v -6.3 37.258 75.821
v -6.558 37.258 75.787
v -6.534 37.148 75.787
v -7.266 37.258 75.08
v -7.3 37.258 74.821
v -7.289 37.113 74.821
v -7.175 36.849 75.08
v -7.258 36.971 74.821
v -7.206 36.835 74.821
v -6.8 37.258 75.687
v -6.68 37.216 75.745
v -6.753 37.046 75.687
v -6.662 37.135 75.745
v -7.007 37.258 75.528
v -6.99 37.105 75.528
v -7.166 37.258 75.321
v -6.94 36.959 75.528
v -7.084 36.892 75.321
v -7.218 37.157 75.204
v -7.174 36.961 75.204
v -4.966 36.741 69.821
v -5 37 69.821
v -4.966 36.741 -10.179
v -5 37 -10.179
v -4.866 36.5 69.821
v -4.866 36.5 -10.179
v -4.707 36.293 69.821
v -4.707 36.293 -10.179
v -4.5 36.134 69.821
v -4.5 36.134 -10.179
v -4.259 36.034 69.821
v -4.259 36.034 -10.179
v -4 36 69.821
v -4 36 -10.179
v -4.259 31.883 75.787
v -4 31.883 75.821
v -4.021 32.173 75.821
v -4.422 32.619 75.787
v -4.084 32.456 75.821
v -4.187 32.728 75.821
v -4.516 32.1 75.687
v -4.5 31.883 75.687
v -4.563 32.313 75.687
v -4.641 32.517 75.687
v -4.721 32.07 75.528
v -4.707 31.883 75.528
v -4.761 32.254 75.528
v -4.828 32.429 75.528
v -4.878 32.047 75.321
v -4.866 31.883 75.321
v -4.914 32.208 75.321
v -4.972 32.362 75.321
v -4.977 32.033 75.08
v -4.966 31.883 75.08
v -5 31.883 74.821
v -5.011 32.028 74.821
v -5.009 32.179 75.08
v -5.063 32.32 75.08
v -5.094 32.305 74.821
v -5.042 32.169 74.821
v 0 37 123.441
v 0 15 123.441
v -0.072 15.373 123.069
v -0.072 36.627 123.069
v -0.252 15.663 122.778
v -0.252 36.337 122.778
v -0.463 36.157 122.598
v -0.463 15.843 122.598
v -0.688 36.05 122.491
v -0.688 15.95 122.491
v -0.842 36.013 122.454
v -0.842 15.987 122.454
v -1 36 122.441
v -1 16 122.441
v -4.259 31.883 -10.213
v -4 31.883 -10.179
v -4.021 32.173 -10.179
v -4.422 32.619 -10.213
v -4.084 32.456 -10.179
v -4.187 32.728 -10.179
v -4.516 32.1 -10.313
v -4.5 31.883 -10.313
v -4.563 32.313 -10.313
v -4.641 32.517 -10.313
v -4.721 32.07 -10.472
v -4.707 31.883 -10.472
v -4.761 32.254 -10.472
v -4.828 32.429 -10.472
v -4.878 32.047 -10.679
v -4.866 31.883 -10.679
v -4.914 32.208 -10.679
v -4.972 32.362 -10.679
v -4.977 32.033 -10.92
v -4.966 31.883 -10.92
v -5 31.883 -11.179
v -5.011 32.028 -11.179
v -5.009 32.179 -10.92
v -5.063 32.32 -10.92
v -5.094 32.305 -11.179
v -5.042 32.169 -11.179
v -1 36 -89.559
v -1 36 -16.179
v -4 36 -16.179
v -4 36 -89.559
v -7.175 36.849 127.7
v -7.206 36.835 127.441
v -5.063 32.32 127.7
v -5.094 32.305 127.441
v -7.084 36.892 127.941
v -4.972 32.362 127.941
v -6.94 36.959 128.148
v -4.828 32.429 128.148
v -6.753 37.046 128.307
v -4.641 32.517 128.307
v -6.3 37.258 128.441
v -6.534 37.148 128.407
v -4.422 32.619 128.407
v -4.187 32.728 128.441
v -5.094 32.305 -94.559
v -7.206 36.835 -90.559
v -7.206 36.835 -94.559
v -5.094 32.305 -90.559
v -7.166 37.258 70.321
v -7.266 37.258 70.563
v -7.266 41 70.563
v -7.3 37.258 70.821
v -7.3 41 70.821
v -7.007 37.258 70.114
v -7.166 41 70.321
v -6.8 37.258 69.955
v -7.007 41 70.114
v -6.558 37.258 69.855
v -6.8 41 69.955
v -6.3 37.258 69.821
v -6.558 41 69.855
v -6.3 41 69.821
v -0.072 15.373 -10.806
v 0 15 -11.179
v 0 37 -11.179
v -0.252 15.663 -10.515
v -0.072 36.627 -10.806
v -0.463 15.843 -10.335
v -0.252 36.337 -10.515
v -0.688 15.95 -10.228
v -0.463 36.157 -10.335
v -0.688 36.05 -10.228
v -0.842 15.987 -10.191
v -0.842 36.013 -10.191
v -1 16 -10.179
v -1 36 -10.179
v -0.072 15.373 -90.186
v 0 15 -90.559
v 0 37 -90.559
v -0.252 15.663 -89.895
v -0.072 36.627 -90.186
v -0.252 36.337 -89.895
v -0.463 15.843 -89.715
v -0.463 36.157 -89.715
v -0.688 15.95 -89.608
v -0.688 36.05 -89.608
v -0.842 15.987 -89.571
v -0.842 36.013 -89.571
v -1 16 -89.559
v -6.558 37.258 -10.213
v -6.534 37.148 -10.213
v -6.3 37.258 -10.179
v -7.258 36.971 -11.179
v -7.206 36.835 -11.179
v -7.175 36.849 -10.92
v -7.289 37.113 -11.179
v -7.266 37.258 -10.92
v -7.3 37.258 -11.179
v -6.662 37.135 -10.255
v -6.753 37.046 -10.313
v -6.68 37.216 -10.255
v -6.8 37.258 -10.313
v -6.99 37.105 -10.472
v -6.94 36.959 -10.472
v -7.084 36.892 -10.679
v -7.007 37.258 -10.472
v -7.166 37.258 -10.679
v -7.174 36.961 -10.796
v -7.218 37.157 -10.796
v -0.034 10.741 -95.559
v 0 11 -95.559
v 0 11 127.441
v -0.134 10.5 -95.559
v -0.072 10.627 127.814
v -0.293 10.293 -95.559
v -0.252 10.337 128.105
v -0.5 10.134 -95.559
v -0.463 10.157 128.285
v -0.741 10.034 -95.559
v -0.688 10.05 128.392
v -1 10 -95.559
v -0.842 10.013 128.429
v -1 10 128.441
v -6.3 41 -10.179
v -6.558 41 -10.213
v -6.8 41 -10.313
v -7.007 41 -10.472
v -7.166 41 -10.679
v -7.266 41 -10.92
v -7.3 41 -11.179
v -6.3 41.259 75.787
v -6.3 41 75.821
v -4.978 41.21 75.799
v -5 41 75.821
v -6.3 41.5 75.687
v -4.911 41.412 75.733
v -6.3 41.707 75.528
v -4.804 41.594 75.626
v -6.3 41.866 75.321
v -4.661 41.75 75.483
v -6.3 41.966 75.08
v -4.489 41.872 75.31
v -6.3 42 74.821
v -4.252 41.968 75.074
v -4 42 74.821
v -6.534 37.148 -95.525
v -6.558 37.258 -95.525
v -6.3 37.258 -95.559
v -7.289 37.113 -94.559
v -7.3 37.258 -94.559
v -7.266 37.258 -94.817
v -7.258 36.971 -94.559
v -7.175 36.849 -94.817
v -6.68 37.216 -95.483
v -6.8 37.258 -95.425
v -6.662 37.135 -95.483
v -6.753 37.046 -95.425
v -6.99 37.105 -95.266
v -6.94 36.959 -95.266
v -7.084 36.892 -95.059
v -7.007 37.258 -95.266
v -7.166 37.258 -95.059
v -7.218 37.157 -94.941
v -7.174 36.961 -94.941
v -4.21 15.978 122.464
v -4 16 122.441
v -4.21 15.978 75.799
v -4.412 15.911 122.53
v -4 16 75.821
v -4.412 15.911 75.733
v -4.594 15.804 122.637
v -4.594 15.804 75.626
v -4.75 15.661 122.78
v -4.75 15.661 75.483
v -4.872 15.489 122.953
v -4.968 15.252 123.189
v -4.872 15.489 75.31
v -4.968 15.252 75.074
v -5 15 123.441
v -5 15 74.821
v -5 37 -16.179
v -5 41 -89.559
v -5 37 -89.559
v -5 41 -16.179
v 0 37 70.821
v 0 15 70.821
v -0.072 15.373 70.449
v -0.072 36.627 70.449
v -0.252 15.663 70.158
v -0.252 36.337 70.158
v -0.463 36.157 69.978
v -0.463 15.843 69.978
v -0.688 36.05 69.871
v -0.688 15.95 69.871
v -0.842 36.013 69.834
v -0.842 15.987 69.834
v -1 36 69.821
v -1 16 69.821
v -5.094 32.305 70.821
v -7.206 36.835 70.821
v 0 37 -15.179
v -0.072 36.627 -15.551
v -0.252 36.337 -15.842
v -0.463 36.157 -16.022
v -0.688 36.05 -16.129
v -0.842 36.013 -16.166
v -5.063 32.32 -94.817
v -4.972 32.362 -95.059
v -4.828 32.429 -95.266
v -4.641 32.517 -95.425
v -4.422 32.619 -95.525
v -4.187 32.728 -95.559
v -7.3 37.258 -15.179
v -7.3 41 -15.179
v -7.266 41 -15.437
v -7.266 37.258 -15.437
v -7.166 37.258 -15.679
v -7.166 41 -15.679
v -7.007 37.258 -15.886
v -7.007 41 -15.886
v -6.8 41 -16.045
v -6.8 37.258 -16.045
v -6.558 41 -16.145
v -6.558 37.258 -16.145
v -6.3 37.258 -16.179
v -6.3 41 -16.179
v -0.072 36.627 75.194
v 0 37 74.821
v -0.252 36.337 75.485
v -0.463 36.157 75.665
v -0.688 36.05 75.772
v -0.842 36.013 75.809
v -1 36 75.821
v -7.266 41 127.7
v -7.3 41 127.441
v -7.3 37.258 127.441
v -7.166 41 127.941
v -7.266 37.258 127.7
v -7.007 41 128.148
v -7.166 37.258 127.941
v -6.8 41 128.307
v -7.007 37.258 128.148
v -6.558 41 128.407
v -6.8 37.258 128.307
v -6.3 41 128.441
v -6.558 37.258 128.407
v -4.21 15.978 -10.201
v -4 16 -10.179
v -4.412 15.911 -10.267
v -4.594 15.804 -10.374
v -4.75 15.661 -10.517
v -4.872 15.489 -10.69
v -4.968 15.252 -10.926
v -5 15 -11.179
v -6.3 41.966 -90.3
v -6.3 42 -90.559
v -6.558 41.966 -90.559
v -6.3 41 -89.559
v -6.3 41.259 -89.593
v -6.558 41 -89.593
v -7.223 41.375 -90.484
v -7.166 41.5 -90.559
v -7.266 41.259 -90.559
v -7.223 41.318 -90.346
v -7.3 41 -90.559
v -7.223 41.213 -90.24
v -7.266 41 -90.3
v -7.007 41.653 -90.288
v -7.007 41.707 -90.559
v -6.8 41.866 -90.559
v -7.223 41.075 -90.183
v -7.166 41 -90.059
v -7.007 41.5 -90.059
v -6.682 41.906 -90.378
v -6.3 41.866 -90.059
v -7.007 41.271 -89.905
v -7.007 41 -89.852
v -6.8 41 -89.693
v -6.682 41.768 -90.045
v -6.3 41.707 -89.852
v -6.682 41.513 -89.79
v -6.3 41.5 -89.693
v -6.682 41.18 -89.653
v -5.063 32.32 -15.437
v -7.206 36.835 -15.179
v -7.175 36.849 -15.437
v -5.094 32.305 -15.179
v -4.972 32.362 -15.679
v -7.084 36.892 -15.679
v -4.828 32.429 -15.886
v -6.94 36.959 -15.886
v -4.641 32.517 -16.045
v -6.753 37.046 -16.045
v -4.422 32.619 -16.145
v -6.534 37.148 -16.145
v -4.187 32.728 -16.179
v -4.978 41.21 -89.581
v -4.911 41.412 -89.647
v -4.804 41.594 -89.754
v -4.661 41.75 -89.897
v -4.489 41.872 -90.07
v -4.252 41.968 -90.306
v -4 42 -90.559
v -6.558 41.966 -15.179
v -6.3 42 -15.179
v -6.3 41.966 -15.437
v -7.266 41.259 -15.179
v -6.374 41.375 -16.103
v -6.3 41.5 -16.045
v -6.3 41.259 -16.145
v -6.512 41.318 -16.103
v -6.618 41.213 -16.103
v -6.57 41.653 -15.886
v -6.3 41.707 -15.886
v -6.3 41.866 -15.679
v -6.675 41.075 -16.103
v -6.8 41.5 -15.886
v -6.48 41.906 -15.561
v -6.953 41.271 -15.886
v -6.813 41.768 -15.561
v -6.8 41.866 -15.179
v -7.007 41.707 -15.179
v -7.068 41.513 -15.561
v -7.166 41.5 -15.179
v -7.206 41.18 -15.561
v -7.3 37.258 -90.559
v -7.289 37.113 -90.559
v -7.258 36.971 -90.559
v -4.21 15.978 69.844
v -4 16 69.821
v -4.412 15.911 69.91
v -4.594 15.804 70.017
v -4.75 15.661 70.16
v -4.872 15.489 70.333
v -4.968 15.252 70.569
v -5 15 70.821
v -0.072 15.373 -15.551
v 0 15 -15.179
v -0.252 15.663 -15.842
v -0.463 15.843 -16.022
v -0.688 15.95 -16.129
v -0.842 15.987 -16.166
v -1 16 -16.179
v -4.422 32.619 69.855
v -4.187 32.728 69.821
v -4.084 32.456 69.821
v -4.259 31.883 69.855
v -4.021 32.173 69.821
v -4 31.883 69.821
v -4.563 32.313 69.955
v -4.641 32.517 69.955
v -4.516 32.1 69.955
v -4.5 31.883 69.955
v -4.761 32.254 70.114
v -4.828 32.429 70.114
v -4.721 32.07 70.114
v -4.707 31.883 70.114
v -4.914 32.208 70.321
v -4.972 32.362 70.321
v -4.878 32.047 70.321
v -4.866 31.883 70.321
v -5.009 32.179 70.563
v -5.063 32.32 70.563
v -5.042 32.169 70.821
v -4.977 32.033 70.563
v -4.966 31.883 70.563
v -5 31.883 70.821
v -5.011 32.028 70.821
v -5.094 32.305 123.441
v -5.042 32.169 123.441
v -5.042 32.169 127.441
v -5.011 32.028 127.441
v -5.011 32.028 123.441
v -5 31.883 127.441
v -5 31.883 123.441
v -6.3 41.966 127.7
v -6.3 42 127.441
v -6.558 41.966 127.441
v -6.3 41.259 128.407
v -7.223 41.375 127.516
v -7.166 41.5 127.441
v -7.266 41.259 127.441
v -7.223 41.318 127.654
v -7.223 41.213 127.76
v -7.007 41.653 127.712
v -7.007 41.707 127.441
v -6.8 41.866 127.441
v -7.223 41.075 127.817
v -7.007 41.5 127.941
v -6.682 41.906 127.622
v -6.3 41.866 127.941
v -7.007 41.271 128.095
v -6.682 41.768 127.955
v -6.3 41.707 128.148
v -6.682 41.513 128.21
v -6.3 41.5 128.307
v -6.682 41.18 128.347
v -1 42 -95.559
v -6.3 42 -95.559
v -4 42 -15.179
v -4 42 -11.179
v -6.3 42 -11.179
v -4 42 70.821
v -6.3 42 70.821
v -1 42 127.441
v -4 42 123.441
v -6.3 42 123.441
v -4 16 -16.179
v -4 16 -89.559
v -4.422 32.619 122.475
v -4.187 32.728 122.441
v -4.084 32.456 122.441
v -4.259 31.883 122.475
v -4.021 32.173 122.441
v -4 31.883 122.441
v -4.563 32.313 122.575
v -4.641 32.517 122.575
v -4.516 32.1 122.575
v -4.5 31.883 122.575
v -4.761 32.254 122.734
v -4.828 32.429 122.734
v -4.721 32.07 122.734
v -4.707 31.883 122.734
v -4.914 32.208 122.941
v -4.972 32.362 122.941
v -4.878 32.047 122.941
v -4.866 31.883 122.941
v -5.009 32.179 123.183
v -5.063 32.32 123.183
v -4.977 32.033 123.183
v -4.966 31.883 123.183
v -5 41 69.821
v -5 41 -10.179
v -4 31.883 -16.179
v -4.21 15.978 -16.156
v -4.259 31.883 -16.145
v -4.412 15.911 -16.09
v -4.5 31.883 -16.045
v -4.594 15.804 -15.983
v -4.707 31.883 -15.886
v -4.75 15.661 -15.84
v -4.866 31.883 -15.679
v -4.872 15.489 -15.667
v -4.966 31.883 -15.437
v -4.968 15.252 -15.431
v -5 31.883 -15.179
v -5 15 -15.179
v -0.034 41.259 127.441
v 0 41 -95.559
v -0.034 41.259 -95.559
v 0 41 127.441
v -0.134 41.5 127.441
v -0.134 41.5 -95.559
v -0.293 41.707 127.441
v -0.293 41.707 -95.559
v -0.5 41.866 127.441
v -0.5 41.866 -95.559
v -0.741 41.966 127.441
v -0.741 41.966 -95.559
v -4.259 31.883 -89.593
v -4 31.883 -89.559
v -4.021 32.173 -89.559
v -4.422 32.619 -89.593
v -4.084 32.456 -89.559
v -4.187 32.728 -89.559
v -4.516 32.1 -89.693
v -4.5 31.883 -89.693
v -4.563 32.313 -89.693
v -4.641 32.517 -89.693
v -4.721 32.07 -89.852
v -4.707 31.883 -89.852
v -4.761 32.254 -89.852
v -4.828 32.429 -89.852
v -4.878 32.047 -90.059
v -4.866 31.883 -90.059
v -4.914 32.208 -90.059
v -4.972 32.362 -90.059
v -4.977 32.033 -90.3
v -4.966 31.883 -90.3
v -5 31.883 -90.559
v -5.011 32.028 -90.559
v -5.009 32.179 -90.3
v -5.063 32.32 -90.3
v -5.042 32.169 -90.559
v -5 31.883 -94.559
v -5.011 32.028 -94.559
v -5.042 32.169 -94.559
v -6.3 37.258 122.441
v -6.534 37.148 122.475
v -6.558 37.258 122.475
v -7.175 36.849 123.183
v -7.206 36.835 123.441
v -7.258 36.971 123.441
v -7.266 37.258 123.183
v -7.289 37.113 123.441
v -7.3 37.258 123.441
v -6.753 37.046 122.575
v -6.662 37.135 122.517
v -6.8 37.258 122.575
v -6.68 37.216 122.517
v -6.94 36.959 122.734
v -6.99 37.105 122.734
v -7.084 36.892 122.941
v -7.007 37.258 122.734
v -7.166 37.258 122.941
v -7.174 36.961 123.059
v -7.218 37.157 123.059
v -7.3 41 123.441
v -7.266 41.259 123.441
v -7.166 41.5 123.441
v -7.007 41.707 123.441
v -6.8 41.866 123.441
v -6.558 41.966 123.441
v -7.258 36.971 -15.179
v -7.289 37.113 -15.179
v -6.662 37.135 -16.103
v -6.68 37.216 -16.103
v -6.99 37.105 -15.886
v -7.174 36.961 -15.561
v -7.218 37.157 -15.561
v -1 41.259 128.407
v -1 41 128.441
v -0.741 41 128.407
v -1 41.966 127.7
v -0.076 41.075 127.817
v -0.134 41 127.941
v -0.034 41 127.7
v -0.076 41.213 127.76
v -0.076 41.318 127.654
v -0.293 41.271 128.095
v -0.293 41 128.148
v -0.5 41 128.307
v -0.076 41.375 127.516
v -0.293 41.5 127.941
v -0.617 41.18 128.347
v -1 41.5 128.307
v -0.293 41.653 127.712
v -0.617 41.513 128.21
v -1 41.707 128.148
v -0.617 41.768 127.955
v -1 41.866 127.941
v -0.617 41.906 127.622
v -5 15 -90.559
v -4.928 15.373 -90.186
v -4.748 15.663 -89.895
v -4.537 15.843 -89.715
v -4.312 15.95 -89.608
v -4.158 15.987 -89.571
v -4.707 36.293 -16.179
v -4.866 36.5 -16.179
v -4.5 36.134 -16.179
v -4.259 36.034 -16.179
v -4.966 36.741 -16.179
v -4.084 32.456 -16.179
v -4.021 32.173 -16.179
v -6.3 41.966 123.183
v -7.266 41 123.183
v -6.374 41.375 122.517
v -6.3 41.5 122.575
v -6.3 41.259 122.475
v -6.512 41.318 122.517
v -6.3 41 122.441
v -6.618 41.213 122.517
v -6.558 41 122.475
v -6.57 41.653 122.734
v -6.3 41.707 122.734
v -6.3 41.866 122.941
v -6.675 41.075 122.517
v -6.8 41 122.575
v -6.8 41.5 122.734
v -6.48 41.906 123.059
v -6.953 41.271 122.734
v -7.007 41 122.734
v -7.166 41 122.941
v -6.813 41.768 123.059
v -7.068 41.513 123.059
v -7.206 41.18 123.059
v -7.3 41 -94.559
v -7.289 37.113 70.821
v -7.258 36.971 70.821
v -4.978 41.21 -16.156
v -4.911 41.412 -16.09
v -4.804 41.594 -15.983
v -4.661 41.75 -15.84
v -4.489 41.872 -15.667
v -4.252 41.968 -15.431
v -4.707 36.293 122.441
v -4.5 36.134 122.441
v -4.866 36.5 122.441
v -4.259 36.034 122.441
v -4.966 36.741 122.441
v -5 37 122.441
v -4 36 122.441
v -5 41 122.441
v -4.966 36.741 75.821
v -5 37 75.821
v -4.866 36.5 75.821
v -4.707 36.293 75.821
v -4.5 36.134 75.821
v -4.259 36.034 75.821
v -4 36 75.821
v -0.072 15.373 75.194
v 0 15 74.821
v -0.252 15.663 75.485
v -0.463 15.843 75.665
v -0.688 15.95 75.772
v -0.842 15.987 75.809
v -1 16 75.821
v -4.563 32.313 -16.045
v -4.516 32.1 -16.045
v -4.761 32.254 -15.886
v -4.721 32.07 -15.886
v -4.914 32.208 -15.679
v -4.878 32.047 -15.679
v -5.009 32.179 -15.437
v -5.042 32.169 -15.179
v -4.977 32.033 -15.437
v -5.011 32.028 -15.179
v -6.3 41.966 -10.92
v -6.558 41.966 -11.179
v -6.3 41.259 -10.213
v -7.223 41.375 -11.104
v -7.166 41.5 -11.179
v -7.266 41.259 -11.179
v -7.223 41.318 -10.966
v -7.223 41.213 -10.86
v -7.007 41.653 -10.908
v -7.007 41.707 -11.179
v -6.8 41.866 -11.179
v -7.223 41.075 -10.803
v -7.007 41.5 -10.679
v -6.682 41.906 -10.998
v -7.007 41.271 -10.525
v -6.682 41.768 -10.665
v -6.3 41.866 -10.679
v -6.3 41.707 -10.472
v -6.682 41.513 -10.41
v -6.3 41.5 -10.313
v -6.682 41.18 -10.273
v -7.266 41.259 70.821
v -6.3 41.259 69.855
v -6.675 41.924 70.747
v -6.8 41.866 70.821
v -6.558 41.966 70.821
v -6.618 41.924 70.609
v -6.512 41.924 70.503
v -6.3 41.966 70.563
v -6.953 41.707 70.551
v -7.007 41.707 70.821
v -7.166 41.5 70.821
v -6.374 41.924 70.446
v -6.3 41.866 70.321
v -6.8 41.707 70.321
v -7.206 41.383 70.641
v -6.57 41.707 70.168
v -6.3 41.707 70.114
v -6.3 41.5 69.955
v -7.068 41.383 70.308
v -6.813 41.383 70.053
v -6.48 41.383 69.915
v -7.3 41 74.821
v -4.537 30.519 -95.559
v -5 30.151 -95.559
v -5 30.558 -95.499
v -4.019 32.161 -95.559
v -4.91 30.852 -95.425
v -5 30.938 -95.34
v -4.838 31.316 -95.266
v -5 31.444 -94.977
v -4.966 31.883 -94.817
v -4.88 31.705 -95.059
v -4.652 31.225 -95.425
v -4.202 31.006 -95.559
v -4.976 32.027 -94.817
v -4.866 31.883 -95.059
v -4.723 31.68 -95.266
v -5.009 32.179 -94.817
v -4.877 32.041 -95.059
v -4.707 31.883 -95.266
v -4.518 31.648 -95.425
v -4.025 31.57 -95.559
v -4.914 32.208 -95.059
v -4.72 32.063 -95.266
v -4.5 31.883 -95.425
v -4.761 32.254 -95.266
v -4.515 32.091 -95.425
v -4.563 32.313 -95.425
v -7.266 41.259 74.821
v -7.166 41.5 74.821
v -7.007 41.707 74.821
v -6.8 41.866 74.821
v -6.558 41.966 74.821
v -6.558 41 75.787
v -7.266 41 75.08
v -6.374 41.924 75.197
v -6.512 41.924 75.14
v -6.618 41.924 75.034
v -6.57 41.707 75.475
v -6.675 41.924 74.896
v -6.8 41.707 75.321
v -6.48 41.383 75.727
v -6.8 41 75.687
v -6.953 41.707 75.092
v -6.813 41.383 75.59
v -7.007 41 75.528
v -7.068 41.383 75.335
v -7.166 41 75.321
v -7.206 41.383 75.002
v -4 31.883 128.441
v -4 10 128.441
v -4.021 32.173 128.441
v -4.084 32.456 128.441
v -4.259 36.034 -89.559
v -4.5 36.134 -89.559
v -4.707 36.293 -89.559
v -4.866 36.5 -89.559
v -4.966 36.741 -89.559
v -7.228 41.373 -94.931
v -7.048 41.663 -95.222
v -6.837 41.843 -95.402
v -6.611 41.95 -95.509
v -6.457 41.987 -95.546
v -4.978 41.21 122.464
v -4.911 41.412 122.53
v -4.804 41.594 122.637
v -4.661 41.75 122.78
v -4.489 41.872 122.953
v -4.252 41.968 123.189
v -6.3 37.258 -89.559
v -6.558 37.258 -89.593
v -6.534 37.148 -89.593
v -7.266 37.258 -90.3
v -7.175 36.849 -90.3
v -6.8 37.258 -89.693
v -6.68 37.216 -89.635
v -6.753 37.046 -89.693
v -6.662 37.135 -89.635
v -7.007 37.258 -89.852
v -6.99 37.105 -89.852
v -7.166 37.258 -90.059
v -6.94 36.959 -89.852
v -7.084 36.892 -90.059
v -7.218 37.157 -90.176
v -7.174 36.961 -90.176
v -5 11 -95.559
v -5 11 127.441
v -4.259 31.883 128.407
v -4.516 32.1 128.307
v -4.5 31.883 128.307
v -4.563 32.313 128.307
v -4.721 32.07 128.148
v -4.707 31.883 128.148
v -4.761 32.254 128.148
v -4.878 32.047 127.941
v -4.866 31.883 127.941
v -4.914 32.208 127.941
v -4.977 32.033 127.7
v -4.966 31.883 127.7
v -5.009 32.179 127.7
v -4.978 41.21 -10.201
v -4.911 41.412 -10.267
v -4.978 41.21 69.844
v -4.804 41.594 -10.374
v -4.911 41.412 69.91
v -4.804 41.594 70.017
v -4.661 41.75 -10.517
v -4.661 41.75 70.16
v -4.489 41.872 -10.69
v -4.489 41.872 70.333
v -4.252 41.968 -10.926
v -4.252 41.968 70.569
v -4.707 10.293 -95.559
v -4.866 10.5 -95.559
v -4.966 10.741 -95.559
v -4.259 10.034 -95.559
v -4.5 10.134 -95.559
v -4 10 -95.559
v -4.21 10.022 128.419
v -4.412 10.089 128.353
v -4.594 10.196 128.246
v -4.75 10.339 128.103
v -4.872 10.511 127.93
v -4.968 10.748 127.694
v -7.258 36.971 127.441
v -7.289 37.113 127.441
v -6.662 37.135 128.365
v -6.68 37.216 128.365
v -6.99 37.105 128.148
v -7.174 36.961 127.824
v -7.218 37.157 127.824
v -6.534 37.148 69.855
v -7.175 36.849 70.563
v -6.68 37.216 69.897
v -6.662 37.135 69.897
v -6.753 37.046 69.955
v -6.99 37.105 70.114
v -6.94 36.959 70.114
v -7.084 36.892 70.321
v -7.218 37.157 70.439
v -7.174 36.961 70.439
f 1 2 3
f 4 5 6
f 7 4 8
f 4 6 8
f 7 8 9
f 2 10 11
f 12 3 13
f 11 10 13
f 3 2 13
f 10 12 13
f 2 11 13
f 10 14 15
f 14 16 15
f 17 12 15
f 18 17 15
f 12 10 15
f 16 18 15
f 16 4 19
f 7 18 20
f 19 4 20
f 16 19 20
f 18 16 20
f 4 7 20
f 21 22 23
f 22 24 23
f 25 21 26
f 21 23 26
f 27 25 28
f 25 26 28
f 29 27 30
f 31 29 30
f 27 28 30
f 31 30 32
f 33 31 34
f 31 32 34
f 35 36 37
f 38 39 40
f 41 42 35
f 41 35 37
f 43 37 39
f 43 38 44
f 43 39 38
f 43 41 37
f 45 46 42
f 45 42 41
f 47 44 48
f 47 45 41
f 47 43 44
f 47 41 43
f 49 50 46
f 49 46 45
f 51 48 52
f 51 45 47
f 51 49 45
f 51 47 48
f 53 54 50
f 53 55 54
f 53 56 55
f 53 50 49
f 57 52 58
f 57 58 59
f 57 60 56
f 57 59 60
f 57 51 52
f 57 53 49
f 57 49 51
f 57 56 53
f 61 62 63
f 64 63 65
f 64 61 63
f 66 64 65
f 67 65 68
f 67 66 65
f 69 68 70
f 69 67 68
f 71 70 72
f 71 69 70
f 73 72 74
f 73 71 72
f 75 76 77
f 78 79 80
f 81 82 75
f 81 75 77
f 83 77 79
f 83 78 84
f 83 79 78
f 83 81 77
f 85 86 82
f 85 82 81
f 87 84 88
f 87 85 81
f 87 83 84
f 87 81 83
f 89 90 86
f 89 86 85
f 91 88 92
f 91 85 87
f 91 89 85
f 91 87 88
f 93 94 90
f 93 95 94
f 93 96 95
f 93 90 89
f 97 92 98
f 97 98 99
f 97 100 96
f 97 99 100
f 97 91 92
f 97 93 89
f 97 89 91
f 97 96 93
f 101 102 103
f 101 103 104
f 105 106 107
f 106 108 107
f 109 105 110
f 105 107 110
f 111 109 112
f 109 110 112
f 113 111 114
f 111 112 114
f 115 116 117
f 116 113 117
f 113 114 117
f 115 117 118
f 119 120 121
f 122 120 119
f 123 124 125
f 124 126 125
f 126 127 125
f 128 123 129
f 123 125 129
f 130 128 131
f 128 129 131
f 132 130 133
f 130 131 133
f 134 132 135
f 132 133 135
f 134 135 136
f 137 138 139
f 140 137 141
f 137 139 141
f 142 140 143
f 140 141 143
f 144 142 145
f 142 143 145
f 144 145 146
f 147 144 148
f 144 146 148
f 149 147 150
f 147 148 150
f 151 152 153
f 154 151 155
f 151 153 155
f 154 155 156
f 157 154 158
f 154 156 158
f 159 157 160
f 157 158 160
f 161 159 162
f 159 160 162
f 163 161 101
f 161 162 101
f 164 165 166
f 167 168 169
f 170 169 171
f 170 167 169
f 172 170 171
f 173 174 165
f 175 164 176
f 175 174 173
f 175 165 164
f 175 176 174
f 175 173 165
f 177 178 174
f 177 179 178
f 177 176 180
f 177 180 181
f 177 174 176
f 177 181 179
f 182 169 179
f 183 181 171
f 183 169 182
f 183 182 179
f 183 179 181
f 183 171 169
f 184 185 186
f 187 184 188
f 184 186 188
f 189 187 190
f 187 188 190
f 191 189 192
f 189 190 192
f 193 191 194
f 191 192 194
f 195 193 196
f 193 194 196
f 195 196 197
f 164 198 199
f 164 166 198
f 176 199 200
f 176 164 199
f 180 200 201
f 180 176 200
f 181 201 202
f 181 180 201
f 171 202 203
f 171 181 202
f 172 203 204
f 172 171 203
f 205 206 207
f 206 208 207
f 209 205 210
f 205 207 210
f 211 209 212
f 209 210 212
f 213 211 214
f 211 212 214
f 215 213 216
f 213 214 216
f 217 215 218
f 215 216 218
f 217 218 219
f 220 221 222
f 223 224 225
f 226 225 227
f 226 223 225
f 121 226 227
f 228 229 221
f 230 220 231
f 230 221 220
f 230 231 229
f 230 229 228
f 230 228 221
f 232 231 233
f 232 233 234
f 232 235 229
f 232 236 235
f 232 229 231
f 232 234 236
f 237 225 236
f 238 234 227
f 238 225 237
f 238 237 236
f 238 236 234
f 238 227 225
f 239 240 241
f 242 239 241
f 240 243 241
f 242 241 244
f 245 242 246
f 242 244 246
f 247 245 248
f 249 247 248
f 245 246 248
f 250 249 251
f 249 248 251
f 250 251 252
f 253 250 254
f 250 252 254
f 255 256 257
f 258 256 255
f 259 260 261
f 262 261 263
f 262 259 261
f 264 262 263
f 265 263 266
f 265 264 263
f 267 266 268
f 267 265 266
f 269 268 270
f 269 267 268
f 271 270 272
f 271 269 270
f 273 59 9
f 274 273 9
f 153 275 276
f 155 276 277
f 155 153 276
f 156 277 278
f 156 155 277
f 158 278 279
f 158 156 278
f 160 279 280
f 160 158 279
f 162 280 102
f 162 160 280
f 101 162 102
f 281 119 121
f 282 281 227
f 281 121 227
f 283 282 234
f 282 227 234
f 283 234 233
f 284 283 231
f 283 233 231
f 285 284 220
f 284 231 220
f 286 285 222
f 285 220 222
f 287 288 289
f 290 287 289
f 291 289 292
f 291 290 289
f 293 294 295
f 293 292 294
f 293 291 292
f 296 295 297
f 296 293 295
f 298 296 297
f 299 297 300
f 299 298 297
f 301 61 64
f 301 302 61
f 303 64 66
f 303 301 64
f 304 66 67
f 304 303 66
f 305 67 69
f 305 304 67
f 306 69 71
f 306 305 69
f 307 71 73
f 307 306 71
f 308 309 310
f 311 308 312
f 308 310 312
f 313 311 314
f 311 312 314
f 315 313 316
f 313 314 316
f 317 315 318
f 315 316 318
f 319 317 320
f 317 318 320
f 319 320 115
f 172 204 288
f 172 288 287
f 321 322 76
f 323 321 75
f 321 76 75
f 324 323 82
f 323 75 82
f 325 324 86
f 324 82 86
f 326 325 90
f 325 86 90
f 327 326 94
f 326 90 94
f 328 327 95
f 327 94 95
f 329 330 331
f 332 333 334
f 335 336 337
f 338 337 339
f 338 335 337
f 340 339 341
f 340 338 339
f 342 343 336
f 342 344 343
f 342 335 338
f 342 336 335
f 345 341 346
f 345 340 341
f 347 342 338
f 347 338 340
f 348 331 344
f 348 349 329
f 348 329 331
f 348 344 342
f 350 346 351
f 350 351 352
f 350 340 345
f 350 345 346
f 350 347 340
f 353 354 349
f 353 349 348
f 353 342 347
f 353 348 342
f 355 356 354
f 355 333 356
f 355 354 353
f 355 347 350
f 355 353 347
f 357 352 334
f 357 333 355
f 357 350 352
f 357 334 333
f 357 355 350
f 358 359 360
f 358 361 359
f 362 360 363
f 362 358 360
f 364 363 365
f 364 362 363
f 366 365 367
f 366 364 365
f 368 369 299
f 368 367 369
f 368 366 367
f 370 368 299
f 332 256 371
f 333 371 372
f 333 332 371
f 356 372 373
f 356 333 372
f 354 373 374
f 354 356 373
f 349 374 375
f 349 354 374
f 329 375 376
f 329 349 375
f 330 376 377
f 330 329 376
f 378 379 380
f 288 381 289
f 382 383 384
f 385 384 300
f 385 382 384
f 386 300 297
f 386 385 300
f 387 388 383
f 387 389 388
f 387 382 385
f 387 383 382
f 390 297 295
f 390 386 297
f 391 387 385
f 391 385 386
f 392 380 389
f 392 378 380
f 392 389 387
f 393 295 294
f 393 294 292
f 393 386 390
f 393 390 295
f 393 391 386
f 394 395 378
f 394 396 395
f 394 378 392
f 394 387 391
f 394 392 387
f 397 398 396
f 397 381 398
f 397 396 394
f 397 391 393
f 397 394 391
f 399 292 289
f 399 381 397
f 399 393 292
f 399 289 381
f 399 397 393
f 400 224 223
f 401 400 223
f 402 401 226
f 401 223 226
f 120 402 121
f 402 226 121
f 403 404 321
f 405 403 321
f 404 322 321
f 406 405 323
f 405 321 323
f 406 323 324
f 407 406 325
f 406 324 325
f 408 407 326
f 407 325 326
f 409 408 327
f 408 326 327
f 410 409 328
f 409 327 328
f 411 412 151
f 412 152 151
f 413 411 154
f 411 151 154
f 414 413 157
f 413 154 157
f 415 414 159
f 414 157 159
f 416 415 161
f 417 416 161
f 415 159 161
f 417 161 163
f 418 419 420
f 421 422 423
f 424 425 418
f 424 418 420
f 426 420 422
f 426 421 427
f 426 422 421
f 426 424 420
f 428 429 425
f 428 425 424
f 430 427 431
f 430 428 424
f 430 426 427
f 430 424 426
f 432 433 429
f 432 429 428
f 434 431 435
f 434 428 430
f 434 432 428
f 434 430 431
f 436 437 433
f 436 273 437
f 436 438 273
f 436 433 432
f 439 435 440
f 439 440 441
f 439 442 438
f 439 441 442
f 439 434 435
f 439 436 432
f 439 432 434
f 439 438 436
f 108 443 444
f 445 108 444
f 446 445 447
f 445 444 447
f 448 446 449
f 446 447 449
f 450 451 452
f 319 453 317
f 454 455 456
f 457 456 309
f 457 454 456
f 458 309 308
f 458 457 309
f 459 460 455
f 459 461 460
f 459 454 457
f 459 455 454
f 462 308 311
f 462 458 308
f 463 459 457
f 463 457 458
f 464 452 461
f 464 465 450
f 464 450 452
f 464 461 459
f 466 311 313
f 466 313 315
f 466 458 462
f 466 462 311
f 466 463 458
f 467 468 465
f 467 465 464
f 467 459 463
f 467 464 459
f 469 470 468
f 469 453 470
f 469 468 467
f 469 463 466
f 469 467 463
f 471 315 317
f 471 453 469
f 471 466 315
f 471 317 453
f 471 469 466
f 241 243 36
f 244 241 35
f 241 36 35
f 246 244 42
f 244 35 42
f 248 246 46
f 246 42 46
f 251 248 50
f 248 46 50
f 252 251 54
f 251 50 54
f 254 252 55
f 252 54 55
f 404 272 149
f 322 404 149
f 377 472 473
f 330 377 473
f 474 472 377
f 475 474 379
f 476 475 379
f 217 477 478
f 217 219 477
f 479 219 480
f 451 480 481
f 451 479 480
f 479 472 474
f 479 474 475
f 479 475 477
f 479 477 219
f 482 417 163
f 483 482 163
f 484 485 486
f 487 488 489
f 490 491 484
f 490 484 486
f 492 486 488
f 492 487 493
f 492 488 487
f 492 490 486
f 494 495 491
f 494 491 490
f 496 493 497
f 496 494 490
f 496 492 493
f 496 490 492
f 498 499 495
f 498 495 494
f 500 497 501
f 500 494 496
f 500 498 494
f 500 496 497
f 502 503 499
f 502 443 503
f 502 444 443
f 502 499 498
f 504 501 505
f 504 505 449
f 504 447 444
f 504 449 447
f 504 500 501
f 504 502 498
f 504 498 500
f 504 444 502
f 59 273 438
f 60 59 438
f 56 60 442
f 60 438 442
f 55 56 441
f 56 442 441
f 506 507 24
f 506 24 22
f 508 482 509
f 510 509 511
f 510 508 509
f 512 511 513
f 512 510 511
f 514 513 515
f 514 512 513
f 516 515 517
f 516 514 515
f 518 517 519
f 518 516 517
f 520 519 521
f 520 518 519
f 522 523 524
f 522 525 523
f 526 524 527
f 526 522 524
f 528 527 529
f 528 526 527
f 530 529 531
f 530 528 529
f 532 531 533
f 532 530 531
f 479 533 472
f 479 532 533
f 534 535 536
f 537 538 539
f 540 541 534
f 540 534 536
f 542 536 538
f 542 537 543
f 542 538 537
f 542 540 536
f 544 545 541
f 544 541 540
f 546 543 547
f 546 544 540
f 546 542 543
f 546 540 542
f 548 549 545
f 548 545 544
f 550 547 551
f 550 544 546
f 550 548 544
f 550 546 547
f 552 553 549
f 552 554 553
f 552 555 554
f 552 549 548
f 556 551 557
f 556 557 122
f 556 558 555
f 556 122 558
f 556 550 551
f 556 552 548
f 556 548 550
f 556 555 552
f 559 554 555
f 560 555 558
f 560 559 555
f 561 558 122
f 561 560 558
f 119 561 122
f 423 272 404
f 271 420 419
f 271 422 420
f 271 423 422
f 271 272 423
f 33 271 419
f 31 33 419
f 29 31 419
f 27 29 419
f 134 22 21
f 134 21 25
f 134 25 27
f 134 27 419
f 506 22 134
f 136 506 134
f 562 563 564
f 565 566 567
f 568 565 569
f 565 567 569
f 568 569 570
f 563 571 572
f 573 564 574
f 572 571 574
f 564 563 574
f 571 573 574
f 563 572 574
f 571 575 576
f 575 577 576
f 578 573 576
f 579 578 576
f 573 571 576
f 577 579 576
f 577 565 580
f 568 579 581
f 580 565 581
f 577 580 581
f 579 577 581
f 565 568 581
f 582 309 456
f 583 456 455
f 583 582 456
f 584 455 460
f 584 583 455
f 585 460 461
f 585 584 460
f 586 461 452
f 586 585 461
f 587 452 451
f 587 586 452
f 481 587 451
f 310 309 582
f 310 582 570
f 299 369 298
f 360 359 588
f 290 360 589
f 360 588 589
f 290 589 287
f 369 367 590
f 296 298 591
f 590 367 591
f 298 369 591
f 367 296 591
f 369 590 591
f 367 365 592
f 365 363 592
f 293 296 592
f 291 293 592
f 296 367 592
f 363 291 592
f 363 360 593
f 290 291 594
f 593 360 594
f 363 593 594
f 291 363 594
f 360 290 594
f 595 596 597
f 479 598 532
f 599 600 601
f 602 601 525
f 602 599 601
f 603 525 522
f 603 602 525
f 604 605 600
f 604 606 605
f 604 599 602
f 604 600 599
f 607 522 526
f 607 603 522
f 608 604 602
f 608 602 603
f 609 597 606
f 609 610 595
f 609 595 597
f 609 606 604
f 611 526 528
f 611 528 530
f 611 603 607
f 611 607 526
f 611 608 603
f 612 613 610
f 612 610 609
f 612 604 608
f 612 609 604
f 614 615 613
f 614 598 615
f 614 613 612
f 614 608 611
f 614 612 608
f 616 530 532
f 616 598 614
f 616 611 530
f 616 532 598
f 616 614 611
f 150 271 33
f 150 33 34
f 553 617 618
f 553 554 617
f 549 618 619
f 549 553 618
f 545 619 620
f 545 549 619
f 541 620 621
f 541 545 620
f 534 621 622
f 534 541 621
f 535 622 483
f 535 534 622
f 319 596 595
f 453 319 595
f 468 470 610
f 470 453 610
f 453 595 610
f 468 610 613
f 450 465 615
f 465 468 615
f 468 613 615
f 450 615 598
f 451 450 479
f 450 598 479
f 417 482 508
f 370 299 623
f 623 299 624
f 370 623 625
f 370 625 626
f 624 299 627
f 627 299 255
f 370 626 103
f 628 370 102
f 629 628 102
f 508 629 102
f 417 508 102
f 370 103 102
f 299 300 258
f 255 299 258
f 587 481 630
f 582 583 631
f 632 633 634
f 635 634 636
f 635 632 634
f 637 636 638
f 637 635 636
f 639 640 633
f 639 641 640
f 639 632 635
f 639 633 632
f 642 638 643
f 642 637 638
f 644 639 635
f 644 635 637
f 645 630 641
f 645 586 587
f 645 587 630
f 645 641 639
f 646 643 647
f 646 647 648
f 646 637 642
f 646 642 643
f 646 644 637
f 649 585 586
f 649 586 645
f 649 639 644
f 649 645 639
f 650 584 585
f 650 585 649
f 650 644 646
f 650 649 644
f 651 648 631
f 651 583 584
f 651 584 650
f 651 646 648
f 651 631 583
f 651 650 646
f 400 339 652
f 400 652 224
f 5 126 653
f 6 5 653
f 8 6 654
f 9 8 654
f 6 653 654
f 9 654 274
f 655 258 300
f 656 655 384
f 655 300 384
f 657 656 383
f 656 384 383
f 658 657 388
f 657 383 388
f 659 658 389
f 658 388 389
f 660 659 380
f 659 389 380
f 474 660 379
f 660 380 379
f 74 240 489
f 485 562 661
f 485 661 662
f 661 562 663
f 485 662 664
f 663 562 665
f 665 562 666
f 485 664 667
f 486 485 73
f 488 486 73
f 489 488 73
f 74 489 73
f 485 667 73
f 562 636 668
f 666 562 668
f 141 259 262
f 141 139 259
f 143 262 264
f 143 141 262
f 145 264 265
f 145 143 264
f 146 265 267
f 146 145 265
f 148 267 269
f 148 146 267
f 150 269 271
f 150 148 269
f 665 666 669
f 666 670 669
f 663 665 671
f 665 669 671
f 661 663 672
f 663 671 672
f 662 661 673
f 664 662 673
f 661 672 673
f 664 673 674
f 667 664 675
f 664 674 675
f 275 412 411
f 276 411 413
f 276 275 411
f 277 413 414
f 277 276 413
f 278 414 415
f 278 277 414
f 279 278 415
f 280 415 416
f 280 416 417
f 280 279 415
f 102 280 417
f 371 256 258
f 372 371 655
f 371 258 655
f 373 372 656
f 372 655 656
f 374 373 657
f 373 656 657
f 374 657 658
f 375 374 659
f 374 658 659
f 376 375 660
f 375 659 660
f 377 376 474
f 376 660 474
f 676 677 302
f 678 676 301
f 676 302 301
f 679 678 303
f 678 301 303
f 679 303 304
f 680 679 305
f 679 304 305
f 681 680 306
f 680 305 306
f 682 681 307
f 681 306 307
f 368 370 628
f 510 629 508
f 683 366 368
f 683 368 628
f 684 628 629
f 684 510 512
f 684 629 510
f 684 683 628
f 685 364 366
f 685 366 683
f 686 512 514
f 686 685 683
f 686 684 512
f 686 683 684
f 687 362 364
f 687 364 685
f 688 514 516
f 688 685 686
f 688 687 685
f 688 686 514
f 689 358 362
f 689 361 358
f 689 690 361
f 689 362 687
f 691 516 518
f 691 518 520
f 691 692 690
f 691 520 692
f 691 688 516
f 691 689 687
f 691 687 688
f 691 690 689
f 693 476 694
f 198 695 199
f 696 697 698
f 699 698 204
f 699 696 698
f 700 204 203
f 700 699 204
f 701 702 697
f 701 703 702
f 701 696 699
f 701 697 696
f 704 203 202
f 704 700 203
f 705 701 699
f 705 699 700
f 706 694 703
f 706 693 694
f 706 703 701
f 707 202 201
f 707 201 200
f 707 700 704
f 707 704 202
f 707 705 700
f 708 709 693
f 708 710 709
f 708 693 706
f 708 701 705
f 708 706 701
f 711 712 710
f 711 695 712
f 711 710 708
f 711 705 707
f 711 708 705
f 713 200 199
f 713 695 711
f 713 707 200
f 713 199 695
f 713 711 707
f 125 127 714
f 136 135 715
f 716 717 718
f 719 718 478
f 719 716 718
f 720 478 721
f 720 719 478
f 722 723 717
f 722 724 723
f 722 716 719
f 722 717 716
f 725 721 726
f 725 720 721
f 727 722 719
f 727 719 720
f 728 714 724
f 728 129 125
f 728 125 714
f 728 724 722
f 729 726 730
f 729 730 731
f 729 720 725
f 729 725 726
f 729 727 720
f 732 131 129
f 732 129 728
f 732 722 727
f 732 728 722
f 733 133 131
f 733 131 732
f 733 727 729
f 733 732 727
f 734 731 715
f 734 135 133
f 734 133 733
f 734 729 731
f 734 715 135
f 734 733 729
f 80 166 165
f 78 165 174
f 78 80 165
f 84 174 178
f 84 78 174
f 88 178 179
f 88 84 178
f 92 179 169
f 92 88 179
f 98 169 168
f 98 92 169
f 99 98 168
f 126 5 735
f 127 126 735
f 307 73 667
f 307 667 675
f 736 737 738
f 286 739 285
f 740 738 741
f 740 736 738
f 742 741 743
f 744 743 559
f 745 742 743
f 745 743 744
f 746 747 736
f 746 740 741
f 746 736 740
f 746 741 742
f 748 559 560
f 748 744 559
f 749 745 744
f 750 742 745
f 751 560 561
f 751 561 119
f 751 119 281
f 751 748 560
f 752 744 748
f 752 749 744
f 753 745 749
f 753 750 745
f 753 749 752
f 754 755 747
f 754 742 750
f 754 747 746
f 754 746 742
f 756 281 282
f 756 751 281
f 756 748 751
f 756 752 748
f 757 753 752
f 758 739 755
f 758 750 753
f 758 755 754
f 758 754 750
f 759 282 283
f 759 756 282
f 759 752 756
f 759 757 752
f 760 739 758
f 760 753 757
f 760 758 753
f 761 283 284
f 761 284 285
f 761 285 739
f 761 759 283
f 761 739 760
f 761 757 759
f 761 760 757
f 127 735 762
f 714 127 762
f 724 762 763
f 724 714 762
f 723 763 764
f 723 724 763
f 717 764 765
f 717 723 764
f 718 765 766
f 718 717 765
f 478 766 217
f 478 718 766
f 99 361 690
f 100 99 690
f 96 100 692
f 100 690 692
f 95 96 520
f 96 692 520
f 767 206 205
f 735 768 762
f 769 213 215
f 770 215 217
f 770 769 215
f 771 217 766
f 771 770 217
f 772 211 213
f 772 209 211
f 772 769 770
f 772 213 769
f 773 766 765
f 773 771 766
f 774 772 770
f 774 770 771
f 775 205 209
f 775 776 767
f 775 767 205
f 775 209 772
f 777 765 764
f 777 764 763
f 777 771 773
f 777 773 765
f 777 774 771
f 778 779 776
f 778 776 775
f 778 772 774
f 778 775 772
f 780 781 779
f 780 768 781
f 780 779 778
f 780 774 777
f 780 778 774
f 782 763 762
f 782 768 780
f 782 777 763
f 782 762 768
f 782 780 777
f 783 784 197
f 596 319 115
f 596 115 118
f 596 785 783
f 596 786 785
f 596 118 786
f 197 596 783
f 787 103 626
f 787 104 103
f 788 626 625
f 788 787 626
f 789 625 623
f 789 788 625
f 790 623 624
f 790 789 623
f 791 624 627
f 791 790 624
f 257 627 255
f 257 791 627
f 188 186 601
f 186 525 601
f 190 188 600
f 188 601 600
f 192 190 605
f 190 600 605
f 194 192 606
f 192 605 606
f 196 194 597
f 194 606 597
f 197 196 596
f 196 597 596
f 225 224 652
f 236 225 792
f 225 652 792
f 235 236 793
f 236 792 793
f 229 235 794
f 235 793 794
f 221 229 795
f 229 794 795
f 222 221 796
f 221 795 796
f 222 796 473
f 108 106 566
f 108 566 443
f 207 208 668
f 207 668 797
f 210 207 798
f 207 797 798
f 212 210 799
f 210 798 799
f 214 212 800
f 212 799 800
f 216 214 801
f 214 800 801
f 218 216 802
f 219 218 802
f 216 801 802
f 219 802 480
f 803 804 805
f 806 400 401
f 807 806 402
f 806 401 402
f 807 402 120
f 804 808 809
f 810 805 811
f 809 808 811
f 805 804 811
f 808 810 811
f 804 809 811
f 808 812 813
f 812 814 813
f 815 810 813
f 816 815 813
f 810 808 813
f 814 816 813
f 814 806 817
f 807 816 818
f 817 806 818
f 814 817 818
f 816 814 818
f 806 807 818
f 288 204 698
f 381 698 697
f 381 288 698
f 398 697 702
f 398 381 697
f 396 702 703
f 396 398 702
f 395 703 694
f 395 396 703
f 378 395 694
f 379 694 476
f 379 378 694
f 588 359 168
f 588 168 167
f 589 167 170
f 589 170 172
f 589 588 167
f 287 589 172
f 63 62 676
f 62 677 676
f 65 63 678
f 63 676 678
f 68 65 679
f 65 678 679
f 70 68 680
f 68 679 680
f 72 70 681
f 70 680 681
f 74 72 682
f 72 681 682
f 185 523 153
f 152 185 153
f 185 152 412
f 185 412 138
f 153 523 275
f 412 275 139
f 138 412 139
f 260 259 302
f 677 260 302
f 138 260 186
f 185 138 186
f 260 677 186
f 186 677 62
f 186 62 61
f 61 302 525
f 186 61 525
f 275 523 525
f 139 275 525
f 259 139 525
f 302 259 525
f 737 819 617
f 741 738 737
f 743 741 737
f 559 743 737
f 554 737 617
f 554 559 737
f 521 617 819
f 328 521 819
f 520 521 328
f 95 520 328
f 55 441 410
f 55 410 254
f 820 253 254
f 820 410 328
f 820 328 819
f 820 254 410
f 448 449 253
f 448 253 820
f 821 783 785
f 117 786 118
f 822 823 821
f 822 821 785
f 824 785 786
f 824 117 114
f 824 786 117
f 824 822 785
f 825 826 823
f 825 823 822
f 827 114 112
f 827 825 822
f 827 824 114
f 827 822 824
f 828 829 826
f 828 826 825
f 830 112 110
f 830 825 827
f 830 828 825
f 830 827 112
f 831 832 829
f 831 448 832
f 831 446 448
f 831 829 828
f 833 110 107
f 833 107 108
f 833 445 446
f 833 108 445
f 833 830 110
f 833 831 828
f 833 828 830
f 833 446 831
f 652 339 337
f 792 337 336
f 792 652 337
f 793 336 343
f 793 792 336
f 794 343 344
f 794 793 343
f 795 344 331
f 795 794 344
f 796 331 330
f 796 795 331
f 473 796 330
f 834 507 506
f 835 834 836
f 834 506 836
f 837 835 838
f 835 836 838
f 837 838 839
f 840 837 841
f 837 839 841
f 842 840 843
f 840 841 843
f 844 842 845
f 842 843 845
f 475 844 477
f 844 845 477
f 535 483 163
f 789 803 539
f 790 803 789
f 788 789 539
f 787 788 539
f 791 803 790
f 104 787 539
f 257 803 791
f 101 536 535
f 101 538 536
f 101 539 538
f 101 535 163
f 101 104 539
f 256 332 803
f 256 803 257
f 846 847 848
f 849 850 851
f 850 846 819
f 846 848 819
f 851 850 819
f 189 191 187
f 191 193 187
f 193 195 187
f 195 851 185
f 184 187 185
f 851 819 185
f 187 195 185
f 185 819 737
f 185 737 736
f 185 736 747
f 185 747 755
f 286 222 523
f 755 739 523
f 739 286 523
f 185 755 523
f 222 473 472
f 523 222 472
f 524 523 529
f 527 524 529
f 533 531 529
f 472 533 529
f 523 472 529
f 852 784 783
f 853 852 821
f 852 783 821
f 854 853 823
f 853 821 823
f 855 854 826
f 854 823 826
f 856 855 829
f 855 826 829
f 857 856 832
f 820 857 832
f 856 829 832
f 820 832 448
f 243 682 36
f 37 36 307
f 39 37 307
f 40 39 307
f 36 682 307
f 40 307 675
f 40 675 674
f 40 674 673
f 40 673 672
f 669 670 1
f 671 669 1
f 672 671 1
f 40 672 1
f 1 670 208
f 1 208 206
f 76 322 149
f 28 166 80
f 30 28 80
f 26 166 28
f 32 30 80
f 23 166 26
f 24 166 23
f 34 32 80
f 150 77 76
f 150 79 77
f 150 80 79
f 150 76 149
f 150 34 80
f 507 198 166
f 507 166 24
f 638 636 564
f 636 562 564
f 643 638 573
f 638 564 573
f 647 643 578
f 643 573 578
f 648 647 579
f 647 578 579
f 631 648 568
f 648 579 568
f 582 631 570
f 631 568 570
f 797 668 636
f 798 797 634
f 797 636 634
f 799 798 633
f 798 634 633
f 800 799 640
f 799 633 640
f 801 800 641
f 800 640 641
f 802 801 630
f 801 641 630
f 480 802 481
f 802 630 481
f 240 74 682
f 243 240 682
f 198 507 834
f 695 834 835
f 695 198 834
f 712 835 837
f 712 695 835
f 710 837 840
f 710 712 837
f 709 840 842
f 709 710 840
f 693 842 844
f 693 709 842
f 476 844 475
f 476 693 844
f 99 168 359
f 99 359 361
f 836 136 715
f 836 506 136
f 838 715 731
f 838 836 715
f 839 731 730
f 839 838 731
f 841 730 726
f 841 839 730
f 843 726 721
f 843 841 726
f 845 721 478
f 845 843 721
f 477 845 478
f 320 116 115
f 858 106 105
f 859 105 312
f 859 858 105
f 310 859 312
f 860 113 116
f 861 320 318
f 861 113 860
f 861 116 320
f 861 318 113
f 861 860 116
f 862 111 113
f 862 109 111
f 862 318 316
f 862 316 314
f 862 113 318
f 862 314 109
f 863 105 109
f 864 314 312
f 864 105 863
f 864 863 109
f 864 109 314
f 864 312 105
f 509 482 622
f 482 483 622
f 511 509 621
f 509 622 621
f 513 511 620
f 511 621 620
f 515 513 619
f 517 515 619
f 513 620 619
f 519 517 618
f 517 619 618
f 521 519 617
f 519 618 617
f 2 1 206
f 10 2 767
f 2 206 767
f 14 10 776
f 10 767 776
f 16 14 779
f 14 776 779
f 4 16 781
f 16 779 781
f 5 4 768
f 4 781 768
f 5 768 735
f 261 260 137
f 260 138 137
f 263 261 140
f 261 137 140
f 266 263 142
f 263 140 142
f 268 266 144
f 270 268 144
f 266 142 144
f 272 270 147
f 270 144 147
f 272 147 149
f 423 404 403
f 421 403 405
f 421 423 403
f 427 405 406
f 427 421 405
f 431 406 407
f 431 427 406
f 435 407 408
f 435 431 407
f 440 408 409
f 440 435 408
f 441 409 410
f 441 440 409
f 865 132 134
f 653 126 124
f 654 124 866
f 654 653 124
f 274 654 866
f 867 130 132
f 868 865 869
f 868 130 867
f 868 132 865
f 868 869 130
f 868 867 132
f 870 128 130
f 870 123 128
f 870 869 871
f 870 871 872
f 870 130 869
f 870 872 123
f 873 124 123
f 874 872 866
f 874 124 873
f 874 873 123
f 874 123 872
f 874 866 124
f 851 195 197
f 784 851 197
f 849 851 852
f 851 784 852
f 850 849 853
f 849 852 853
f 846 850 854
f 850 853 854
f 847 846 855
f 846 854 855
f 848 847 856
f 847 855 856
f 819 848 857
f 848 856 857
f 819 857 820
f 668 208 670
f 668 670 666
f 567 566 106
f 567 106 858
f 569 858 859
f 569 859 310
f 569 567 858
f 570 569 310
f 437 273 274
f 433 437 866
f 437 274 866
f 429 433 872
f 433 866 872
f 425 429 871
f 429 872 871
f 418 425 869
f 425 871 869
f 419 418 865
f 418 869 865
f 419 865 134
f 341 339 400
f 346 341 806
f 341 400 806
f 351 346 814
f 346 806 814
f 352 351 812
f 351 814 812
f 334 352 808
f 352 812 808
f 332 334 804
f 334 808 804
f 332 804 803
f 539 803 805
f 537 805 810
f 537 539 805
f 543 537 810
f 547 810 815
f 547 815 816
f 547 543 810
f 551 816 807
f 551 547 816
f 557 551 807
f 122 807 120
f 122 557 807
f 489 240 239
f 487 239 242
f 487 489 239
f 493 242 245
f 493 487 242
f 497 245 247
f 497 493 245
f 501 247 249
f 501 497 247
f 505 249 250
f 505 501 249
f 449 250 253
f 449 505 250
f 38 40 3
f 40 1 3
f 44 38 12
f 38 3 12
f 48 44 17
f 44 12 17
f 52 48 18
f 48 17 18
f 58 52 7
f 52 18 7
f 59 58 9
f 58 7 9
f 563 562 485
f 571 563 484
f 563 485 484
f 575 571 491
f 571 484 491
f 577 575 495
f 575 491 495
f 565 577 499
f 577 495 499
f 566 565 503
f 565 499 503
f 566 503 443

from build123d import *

# Parameters (mm, degrees)
ESBO_O8_W                = 80
ESBO_O8_H                = 20
ESBO_O8_W_2              = 73.38
ESBO_O8_W_3              = 46.62
RESSALTO_EXTRUS_O1_DEPTH = 5
RESSALTO_EXTRUS_O2_DEPTH = 6
RESSALTO_EXTRUS_O3_DEPTH = 6
RESSALTO_EXTRUS_O4_DEPTH = 6
RESSALTO_EXTRUS_O5_DEPTH = 6
FILETE1_R                = 1
FILETE2_R                = 1


with BuildPart() as part:
    # Esboço8 → Ressalto-extrusão1 (new body)
    with BuildSketch(Plane(origin=(0, 0, 0), x_dir=(0, 0, -1), z_dir=(1, 0, 0))):
        Polygon((95.558629268, 10), (-128.441370732, 10), (-128.441370732, 42), (70.171505342, 42), (95.558629268, 42), align=None)
        with Locations((-29.821370732, 26)):
            Rectangle(ESBO_O8_W, ESBO_O8_H, mode=Mode.SUBTRACT)
        with Locations((52.868629268, 26)):
            Rectangle(ESBO_O8_W_2, ESBO_O8_H, mode=Mode.SUBTRACT)
        with Locations((-99.131370732, 26)):
            Rectangle(ESBO_O8_W_3, ESBO_O8_H, mode=Mode.SUBTRACT)
    extrude(amount=-RESSALTO_EXTRUS_O1_DEPTH)

    # Esboço9 → Ressalto-extrusão2 (add)
    with BuildSketch(Plane.XY.offset(75.821370732)):
        Polygon((-7.299581581, 42), (-5, 42), (-5, 32.104391167), (-7.299581581, 37.035859781), align=None)
    extrude(amount=-RESSALTO_EXTRUS_O2_DEPTH)

    # Esboço10 → Ressalto-extrusão3 (add)
    with BuildSketch(Plane.XY.offset(-10.178629268)):
        Polygon((-5, 32.104391167), (-5, 36), (-5, 42), (-7.299581581, 42), (-7.299581581, 37.035859781), align=None)
    extrude(amount=-RESSALTO_EXTRUS_O3_DEPTH)

    # Esboço11 → Ressalto-extrusão4 (add)
    with BuildSketch(Plane.XY.offset(128.441370732)):
        Polygon((-5, 32.104391167), (-5, 36), (-5, 42), (-7.299581581, 42), (-7.299581581, 37.035859781), align=None)
    extrude(amount=-RESSALTO_EXTRUS_O4_DEPTH)

    # Esboço12 → Ressalto-extrusão5 (add)
    with BuildSketch(Plane.XY.offset(-89.558629268)):
        Polygon((-7.299581581, 42), (-7.299581581, 37.035859781), (-5, 32.104391167), (-5, 42), align=None)
    extrude(amount=-RESSALTO_EXTRUS_O5_DEPTH)

    # Filete1
    filete1_edges = [part.edges().sort_by_distance(p)[0] for p in [
        (-6.14979079, 34.570125474, 75.821370732),
        (-6.14979079, 34.570125474, 69.821370732),
        (-7.299581581, 37.035859781, 72.821370732),
        (-7.299581581, 39.51792989, 75.821370732),
        (-7.299581581, 39.51792989, 69.821370732),
        (-7.299581581, 37.035859781, 125.441370732),
        (-7.299581581, 37.035859781, -13.178629268),
        (-3.64979079, 42, 128.441370732),
        (-7.299581581, 42, 125.441370732),
        (-6.14979079, 42, 122.441370732),
        (-5, 42, 99.131370732),
        (-6.14979079, 42, 75.821370732),
        (-7.299581581, 42, 72.821370732),
        (-6.14979079, 42, 69.821370732),
        (-5, 42, 29.821370732),
        (-6.14979079, 42, -10.178629268),
        (-7.299581581, 42, -13.178629268),
        (-6.14979079, 42, -16.178629268),
        (-5, 42, -52.868629268),
        (-6.14979079, 42, -89.558629268),
        (0, 10, 16.441370732),
        (0, 26, 128.441370732),
        (0, 42, 16.441370732),
        (0, 26, -16.178629268),
        (0, 16, -52.868629268),
        (0, 26, -89.558629268),
        (0, 36, -52.868629268),
        (0, 26, 75.821370732),
        (0, 36, 99.131370732),
        (0, 26, 122.441370732),
        (0, 16, 99.131370732),
        (0, 36, 29.821370732),
        (0, 26, 69.821370732),
        (0, 16, 29.821370732),
        (0, 26, -10.178629268),
        (-5, 24.052195584, -89.558629268),
        (-5, 16, -52.868629268),
        (-5, 24.052195584, -16.178629268),
        (-5, 32.104391167, -13.178629268),
        (-5, 24.052195584, -10.178629268),
        (-5, 16, 29.821370732),
        (-5, 24.052195584, 69.821370732),
        (-5, 32.104391167, 72.821370732),
        (-5, 24.052195584, 75.821370732),
        (-5, 16, 99.131370732),
        (-5, 24.052195584, 122.441370732),
        (-5, 32.104391167, 125.441370732),
        (-5, 21.052195584, 128.441370732),
        (-5, 10, 16.441370732),
        (-5, 36, -52.868629268),
        (-5, 36, 29.821370732),
        (-5, 36, 99.131370732),
        (-6.14979079, 34.570125474, -89.558629268),
        (-6.14979079, 34.570125474, 128.441370732),
        (-6.14979079, 34.570125474, 122.441370732),
        (-6.14979079, 34.570125474, -10.178629268),
        (-6.14979079, 34.570125474, -16.178629268),
        (-7.299581581, 39.51792989, 128.441370732),
        (-7.299581581, 39.51792989, 122.441370732),
        (-7.299581581, 39.51792989, -10.178629268),
        (-7.299581581, 39.51792989, -16.178629268),
        (-7.299581581, 42, -92.558629268),
        (-5, 32.104391167, -92.558629268),
        (-7.299581581, 37.035859781, -92.558629268),
        (-7.299581581, 39.51792989, -89.558629268),
    ]]
    fillet(filete1_edges, radius=FILETE1_R)

    # Filete2
    # the kernel refuses this fillet: 1 mm, written as the material it takes off along each edge
    with BuildSketch(Plane(origin=(-6, 31.882696504, -95.558629268), x_dir=(-0.80118997671776, -0.5984100777953153, 0), z_dir=(-0.5984100777953153, 0.80118997671776, 0))) as filete2_piece_1:
        with BuildLine():
            CenterArc((1 + FILETE2_R, FILETE2_R), FILETE2_R, 180, 90)
            Line((1, FILETE2_R), (1, 0))
            Line((1, 0), (1 + FILETE2_R, 0))
        make_face()
    revolve(axis=Axis((-6, 31.882696504, -95.558629268), (0, 0, 1)), revolution_arc=168.243887481, mode=Mode.SUBTRACT)
    with BuildSketch(Plane(origin=(-6.299581581, 37.257554444, -95.558629268), x_dir=(-1, 0, 0), z_dir=(0, 1, 0))) as filete2_piece_2:
        with BuildLine():
            CenterArc((1 - FILETE2_R, FILETE2_R), FILETE2_R, 270, 90)
            Line((1, FILETE2_R), (1, 0))
            Line((1, 0), (1 - FILETE2_R, 0))
        make_face()
    revolve(axis=Axis((-6.299581581, 37.257554444, -95.558629268), (0, 0, 1)), revolution_arc=25, mode=Mode.SUBTRACT)
    with BuildSketch(Plane(origin=(-7.205889368, 36.834936182, -95.558629268), x_dir=(0.9063077870366507, 0.4226182617406979, 0), z_dir=(0.42261826174069794, -0.9063077870366507, 0))) as filete2_piece_3:
        with BuildLine():
            CenterArc((FILETE2_R, FILETE2_R), FILETE2_R, 180, 90)
            Line((0, FILETE2_R), (0, 0))
            Line((0, 0), (FILETE2_R, 0))
        make_face()
    extrude(amount=4.997884251, mode=Mode.SUBTRACT)
    with BuildSketch(Plane(origin=(-7.299581581, 43.5, -95.558629268), x_dir=(1, 0, 0), z_dir=(0, -1, 0))) as filete2_piece_4:
        with BuildLine():
            CenterArc((FILETE2_R, FILETE2_R), FILETE2_R, 180, 90)
            Line((0, FILETE2_R), (0, 0))
            Line((0, 0), (FILETE2_R, 0))
        make_face()
    extrude(amount=6.242445556, mode=Mode.SUBTRACT)


solid = part.part
